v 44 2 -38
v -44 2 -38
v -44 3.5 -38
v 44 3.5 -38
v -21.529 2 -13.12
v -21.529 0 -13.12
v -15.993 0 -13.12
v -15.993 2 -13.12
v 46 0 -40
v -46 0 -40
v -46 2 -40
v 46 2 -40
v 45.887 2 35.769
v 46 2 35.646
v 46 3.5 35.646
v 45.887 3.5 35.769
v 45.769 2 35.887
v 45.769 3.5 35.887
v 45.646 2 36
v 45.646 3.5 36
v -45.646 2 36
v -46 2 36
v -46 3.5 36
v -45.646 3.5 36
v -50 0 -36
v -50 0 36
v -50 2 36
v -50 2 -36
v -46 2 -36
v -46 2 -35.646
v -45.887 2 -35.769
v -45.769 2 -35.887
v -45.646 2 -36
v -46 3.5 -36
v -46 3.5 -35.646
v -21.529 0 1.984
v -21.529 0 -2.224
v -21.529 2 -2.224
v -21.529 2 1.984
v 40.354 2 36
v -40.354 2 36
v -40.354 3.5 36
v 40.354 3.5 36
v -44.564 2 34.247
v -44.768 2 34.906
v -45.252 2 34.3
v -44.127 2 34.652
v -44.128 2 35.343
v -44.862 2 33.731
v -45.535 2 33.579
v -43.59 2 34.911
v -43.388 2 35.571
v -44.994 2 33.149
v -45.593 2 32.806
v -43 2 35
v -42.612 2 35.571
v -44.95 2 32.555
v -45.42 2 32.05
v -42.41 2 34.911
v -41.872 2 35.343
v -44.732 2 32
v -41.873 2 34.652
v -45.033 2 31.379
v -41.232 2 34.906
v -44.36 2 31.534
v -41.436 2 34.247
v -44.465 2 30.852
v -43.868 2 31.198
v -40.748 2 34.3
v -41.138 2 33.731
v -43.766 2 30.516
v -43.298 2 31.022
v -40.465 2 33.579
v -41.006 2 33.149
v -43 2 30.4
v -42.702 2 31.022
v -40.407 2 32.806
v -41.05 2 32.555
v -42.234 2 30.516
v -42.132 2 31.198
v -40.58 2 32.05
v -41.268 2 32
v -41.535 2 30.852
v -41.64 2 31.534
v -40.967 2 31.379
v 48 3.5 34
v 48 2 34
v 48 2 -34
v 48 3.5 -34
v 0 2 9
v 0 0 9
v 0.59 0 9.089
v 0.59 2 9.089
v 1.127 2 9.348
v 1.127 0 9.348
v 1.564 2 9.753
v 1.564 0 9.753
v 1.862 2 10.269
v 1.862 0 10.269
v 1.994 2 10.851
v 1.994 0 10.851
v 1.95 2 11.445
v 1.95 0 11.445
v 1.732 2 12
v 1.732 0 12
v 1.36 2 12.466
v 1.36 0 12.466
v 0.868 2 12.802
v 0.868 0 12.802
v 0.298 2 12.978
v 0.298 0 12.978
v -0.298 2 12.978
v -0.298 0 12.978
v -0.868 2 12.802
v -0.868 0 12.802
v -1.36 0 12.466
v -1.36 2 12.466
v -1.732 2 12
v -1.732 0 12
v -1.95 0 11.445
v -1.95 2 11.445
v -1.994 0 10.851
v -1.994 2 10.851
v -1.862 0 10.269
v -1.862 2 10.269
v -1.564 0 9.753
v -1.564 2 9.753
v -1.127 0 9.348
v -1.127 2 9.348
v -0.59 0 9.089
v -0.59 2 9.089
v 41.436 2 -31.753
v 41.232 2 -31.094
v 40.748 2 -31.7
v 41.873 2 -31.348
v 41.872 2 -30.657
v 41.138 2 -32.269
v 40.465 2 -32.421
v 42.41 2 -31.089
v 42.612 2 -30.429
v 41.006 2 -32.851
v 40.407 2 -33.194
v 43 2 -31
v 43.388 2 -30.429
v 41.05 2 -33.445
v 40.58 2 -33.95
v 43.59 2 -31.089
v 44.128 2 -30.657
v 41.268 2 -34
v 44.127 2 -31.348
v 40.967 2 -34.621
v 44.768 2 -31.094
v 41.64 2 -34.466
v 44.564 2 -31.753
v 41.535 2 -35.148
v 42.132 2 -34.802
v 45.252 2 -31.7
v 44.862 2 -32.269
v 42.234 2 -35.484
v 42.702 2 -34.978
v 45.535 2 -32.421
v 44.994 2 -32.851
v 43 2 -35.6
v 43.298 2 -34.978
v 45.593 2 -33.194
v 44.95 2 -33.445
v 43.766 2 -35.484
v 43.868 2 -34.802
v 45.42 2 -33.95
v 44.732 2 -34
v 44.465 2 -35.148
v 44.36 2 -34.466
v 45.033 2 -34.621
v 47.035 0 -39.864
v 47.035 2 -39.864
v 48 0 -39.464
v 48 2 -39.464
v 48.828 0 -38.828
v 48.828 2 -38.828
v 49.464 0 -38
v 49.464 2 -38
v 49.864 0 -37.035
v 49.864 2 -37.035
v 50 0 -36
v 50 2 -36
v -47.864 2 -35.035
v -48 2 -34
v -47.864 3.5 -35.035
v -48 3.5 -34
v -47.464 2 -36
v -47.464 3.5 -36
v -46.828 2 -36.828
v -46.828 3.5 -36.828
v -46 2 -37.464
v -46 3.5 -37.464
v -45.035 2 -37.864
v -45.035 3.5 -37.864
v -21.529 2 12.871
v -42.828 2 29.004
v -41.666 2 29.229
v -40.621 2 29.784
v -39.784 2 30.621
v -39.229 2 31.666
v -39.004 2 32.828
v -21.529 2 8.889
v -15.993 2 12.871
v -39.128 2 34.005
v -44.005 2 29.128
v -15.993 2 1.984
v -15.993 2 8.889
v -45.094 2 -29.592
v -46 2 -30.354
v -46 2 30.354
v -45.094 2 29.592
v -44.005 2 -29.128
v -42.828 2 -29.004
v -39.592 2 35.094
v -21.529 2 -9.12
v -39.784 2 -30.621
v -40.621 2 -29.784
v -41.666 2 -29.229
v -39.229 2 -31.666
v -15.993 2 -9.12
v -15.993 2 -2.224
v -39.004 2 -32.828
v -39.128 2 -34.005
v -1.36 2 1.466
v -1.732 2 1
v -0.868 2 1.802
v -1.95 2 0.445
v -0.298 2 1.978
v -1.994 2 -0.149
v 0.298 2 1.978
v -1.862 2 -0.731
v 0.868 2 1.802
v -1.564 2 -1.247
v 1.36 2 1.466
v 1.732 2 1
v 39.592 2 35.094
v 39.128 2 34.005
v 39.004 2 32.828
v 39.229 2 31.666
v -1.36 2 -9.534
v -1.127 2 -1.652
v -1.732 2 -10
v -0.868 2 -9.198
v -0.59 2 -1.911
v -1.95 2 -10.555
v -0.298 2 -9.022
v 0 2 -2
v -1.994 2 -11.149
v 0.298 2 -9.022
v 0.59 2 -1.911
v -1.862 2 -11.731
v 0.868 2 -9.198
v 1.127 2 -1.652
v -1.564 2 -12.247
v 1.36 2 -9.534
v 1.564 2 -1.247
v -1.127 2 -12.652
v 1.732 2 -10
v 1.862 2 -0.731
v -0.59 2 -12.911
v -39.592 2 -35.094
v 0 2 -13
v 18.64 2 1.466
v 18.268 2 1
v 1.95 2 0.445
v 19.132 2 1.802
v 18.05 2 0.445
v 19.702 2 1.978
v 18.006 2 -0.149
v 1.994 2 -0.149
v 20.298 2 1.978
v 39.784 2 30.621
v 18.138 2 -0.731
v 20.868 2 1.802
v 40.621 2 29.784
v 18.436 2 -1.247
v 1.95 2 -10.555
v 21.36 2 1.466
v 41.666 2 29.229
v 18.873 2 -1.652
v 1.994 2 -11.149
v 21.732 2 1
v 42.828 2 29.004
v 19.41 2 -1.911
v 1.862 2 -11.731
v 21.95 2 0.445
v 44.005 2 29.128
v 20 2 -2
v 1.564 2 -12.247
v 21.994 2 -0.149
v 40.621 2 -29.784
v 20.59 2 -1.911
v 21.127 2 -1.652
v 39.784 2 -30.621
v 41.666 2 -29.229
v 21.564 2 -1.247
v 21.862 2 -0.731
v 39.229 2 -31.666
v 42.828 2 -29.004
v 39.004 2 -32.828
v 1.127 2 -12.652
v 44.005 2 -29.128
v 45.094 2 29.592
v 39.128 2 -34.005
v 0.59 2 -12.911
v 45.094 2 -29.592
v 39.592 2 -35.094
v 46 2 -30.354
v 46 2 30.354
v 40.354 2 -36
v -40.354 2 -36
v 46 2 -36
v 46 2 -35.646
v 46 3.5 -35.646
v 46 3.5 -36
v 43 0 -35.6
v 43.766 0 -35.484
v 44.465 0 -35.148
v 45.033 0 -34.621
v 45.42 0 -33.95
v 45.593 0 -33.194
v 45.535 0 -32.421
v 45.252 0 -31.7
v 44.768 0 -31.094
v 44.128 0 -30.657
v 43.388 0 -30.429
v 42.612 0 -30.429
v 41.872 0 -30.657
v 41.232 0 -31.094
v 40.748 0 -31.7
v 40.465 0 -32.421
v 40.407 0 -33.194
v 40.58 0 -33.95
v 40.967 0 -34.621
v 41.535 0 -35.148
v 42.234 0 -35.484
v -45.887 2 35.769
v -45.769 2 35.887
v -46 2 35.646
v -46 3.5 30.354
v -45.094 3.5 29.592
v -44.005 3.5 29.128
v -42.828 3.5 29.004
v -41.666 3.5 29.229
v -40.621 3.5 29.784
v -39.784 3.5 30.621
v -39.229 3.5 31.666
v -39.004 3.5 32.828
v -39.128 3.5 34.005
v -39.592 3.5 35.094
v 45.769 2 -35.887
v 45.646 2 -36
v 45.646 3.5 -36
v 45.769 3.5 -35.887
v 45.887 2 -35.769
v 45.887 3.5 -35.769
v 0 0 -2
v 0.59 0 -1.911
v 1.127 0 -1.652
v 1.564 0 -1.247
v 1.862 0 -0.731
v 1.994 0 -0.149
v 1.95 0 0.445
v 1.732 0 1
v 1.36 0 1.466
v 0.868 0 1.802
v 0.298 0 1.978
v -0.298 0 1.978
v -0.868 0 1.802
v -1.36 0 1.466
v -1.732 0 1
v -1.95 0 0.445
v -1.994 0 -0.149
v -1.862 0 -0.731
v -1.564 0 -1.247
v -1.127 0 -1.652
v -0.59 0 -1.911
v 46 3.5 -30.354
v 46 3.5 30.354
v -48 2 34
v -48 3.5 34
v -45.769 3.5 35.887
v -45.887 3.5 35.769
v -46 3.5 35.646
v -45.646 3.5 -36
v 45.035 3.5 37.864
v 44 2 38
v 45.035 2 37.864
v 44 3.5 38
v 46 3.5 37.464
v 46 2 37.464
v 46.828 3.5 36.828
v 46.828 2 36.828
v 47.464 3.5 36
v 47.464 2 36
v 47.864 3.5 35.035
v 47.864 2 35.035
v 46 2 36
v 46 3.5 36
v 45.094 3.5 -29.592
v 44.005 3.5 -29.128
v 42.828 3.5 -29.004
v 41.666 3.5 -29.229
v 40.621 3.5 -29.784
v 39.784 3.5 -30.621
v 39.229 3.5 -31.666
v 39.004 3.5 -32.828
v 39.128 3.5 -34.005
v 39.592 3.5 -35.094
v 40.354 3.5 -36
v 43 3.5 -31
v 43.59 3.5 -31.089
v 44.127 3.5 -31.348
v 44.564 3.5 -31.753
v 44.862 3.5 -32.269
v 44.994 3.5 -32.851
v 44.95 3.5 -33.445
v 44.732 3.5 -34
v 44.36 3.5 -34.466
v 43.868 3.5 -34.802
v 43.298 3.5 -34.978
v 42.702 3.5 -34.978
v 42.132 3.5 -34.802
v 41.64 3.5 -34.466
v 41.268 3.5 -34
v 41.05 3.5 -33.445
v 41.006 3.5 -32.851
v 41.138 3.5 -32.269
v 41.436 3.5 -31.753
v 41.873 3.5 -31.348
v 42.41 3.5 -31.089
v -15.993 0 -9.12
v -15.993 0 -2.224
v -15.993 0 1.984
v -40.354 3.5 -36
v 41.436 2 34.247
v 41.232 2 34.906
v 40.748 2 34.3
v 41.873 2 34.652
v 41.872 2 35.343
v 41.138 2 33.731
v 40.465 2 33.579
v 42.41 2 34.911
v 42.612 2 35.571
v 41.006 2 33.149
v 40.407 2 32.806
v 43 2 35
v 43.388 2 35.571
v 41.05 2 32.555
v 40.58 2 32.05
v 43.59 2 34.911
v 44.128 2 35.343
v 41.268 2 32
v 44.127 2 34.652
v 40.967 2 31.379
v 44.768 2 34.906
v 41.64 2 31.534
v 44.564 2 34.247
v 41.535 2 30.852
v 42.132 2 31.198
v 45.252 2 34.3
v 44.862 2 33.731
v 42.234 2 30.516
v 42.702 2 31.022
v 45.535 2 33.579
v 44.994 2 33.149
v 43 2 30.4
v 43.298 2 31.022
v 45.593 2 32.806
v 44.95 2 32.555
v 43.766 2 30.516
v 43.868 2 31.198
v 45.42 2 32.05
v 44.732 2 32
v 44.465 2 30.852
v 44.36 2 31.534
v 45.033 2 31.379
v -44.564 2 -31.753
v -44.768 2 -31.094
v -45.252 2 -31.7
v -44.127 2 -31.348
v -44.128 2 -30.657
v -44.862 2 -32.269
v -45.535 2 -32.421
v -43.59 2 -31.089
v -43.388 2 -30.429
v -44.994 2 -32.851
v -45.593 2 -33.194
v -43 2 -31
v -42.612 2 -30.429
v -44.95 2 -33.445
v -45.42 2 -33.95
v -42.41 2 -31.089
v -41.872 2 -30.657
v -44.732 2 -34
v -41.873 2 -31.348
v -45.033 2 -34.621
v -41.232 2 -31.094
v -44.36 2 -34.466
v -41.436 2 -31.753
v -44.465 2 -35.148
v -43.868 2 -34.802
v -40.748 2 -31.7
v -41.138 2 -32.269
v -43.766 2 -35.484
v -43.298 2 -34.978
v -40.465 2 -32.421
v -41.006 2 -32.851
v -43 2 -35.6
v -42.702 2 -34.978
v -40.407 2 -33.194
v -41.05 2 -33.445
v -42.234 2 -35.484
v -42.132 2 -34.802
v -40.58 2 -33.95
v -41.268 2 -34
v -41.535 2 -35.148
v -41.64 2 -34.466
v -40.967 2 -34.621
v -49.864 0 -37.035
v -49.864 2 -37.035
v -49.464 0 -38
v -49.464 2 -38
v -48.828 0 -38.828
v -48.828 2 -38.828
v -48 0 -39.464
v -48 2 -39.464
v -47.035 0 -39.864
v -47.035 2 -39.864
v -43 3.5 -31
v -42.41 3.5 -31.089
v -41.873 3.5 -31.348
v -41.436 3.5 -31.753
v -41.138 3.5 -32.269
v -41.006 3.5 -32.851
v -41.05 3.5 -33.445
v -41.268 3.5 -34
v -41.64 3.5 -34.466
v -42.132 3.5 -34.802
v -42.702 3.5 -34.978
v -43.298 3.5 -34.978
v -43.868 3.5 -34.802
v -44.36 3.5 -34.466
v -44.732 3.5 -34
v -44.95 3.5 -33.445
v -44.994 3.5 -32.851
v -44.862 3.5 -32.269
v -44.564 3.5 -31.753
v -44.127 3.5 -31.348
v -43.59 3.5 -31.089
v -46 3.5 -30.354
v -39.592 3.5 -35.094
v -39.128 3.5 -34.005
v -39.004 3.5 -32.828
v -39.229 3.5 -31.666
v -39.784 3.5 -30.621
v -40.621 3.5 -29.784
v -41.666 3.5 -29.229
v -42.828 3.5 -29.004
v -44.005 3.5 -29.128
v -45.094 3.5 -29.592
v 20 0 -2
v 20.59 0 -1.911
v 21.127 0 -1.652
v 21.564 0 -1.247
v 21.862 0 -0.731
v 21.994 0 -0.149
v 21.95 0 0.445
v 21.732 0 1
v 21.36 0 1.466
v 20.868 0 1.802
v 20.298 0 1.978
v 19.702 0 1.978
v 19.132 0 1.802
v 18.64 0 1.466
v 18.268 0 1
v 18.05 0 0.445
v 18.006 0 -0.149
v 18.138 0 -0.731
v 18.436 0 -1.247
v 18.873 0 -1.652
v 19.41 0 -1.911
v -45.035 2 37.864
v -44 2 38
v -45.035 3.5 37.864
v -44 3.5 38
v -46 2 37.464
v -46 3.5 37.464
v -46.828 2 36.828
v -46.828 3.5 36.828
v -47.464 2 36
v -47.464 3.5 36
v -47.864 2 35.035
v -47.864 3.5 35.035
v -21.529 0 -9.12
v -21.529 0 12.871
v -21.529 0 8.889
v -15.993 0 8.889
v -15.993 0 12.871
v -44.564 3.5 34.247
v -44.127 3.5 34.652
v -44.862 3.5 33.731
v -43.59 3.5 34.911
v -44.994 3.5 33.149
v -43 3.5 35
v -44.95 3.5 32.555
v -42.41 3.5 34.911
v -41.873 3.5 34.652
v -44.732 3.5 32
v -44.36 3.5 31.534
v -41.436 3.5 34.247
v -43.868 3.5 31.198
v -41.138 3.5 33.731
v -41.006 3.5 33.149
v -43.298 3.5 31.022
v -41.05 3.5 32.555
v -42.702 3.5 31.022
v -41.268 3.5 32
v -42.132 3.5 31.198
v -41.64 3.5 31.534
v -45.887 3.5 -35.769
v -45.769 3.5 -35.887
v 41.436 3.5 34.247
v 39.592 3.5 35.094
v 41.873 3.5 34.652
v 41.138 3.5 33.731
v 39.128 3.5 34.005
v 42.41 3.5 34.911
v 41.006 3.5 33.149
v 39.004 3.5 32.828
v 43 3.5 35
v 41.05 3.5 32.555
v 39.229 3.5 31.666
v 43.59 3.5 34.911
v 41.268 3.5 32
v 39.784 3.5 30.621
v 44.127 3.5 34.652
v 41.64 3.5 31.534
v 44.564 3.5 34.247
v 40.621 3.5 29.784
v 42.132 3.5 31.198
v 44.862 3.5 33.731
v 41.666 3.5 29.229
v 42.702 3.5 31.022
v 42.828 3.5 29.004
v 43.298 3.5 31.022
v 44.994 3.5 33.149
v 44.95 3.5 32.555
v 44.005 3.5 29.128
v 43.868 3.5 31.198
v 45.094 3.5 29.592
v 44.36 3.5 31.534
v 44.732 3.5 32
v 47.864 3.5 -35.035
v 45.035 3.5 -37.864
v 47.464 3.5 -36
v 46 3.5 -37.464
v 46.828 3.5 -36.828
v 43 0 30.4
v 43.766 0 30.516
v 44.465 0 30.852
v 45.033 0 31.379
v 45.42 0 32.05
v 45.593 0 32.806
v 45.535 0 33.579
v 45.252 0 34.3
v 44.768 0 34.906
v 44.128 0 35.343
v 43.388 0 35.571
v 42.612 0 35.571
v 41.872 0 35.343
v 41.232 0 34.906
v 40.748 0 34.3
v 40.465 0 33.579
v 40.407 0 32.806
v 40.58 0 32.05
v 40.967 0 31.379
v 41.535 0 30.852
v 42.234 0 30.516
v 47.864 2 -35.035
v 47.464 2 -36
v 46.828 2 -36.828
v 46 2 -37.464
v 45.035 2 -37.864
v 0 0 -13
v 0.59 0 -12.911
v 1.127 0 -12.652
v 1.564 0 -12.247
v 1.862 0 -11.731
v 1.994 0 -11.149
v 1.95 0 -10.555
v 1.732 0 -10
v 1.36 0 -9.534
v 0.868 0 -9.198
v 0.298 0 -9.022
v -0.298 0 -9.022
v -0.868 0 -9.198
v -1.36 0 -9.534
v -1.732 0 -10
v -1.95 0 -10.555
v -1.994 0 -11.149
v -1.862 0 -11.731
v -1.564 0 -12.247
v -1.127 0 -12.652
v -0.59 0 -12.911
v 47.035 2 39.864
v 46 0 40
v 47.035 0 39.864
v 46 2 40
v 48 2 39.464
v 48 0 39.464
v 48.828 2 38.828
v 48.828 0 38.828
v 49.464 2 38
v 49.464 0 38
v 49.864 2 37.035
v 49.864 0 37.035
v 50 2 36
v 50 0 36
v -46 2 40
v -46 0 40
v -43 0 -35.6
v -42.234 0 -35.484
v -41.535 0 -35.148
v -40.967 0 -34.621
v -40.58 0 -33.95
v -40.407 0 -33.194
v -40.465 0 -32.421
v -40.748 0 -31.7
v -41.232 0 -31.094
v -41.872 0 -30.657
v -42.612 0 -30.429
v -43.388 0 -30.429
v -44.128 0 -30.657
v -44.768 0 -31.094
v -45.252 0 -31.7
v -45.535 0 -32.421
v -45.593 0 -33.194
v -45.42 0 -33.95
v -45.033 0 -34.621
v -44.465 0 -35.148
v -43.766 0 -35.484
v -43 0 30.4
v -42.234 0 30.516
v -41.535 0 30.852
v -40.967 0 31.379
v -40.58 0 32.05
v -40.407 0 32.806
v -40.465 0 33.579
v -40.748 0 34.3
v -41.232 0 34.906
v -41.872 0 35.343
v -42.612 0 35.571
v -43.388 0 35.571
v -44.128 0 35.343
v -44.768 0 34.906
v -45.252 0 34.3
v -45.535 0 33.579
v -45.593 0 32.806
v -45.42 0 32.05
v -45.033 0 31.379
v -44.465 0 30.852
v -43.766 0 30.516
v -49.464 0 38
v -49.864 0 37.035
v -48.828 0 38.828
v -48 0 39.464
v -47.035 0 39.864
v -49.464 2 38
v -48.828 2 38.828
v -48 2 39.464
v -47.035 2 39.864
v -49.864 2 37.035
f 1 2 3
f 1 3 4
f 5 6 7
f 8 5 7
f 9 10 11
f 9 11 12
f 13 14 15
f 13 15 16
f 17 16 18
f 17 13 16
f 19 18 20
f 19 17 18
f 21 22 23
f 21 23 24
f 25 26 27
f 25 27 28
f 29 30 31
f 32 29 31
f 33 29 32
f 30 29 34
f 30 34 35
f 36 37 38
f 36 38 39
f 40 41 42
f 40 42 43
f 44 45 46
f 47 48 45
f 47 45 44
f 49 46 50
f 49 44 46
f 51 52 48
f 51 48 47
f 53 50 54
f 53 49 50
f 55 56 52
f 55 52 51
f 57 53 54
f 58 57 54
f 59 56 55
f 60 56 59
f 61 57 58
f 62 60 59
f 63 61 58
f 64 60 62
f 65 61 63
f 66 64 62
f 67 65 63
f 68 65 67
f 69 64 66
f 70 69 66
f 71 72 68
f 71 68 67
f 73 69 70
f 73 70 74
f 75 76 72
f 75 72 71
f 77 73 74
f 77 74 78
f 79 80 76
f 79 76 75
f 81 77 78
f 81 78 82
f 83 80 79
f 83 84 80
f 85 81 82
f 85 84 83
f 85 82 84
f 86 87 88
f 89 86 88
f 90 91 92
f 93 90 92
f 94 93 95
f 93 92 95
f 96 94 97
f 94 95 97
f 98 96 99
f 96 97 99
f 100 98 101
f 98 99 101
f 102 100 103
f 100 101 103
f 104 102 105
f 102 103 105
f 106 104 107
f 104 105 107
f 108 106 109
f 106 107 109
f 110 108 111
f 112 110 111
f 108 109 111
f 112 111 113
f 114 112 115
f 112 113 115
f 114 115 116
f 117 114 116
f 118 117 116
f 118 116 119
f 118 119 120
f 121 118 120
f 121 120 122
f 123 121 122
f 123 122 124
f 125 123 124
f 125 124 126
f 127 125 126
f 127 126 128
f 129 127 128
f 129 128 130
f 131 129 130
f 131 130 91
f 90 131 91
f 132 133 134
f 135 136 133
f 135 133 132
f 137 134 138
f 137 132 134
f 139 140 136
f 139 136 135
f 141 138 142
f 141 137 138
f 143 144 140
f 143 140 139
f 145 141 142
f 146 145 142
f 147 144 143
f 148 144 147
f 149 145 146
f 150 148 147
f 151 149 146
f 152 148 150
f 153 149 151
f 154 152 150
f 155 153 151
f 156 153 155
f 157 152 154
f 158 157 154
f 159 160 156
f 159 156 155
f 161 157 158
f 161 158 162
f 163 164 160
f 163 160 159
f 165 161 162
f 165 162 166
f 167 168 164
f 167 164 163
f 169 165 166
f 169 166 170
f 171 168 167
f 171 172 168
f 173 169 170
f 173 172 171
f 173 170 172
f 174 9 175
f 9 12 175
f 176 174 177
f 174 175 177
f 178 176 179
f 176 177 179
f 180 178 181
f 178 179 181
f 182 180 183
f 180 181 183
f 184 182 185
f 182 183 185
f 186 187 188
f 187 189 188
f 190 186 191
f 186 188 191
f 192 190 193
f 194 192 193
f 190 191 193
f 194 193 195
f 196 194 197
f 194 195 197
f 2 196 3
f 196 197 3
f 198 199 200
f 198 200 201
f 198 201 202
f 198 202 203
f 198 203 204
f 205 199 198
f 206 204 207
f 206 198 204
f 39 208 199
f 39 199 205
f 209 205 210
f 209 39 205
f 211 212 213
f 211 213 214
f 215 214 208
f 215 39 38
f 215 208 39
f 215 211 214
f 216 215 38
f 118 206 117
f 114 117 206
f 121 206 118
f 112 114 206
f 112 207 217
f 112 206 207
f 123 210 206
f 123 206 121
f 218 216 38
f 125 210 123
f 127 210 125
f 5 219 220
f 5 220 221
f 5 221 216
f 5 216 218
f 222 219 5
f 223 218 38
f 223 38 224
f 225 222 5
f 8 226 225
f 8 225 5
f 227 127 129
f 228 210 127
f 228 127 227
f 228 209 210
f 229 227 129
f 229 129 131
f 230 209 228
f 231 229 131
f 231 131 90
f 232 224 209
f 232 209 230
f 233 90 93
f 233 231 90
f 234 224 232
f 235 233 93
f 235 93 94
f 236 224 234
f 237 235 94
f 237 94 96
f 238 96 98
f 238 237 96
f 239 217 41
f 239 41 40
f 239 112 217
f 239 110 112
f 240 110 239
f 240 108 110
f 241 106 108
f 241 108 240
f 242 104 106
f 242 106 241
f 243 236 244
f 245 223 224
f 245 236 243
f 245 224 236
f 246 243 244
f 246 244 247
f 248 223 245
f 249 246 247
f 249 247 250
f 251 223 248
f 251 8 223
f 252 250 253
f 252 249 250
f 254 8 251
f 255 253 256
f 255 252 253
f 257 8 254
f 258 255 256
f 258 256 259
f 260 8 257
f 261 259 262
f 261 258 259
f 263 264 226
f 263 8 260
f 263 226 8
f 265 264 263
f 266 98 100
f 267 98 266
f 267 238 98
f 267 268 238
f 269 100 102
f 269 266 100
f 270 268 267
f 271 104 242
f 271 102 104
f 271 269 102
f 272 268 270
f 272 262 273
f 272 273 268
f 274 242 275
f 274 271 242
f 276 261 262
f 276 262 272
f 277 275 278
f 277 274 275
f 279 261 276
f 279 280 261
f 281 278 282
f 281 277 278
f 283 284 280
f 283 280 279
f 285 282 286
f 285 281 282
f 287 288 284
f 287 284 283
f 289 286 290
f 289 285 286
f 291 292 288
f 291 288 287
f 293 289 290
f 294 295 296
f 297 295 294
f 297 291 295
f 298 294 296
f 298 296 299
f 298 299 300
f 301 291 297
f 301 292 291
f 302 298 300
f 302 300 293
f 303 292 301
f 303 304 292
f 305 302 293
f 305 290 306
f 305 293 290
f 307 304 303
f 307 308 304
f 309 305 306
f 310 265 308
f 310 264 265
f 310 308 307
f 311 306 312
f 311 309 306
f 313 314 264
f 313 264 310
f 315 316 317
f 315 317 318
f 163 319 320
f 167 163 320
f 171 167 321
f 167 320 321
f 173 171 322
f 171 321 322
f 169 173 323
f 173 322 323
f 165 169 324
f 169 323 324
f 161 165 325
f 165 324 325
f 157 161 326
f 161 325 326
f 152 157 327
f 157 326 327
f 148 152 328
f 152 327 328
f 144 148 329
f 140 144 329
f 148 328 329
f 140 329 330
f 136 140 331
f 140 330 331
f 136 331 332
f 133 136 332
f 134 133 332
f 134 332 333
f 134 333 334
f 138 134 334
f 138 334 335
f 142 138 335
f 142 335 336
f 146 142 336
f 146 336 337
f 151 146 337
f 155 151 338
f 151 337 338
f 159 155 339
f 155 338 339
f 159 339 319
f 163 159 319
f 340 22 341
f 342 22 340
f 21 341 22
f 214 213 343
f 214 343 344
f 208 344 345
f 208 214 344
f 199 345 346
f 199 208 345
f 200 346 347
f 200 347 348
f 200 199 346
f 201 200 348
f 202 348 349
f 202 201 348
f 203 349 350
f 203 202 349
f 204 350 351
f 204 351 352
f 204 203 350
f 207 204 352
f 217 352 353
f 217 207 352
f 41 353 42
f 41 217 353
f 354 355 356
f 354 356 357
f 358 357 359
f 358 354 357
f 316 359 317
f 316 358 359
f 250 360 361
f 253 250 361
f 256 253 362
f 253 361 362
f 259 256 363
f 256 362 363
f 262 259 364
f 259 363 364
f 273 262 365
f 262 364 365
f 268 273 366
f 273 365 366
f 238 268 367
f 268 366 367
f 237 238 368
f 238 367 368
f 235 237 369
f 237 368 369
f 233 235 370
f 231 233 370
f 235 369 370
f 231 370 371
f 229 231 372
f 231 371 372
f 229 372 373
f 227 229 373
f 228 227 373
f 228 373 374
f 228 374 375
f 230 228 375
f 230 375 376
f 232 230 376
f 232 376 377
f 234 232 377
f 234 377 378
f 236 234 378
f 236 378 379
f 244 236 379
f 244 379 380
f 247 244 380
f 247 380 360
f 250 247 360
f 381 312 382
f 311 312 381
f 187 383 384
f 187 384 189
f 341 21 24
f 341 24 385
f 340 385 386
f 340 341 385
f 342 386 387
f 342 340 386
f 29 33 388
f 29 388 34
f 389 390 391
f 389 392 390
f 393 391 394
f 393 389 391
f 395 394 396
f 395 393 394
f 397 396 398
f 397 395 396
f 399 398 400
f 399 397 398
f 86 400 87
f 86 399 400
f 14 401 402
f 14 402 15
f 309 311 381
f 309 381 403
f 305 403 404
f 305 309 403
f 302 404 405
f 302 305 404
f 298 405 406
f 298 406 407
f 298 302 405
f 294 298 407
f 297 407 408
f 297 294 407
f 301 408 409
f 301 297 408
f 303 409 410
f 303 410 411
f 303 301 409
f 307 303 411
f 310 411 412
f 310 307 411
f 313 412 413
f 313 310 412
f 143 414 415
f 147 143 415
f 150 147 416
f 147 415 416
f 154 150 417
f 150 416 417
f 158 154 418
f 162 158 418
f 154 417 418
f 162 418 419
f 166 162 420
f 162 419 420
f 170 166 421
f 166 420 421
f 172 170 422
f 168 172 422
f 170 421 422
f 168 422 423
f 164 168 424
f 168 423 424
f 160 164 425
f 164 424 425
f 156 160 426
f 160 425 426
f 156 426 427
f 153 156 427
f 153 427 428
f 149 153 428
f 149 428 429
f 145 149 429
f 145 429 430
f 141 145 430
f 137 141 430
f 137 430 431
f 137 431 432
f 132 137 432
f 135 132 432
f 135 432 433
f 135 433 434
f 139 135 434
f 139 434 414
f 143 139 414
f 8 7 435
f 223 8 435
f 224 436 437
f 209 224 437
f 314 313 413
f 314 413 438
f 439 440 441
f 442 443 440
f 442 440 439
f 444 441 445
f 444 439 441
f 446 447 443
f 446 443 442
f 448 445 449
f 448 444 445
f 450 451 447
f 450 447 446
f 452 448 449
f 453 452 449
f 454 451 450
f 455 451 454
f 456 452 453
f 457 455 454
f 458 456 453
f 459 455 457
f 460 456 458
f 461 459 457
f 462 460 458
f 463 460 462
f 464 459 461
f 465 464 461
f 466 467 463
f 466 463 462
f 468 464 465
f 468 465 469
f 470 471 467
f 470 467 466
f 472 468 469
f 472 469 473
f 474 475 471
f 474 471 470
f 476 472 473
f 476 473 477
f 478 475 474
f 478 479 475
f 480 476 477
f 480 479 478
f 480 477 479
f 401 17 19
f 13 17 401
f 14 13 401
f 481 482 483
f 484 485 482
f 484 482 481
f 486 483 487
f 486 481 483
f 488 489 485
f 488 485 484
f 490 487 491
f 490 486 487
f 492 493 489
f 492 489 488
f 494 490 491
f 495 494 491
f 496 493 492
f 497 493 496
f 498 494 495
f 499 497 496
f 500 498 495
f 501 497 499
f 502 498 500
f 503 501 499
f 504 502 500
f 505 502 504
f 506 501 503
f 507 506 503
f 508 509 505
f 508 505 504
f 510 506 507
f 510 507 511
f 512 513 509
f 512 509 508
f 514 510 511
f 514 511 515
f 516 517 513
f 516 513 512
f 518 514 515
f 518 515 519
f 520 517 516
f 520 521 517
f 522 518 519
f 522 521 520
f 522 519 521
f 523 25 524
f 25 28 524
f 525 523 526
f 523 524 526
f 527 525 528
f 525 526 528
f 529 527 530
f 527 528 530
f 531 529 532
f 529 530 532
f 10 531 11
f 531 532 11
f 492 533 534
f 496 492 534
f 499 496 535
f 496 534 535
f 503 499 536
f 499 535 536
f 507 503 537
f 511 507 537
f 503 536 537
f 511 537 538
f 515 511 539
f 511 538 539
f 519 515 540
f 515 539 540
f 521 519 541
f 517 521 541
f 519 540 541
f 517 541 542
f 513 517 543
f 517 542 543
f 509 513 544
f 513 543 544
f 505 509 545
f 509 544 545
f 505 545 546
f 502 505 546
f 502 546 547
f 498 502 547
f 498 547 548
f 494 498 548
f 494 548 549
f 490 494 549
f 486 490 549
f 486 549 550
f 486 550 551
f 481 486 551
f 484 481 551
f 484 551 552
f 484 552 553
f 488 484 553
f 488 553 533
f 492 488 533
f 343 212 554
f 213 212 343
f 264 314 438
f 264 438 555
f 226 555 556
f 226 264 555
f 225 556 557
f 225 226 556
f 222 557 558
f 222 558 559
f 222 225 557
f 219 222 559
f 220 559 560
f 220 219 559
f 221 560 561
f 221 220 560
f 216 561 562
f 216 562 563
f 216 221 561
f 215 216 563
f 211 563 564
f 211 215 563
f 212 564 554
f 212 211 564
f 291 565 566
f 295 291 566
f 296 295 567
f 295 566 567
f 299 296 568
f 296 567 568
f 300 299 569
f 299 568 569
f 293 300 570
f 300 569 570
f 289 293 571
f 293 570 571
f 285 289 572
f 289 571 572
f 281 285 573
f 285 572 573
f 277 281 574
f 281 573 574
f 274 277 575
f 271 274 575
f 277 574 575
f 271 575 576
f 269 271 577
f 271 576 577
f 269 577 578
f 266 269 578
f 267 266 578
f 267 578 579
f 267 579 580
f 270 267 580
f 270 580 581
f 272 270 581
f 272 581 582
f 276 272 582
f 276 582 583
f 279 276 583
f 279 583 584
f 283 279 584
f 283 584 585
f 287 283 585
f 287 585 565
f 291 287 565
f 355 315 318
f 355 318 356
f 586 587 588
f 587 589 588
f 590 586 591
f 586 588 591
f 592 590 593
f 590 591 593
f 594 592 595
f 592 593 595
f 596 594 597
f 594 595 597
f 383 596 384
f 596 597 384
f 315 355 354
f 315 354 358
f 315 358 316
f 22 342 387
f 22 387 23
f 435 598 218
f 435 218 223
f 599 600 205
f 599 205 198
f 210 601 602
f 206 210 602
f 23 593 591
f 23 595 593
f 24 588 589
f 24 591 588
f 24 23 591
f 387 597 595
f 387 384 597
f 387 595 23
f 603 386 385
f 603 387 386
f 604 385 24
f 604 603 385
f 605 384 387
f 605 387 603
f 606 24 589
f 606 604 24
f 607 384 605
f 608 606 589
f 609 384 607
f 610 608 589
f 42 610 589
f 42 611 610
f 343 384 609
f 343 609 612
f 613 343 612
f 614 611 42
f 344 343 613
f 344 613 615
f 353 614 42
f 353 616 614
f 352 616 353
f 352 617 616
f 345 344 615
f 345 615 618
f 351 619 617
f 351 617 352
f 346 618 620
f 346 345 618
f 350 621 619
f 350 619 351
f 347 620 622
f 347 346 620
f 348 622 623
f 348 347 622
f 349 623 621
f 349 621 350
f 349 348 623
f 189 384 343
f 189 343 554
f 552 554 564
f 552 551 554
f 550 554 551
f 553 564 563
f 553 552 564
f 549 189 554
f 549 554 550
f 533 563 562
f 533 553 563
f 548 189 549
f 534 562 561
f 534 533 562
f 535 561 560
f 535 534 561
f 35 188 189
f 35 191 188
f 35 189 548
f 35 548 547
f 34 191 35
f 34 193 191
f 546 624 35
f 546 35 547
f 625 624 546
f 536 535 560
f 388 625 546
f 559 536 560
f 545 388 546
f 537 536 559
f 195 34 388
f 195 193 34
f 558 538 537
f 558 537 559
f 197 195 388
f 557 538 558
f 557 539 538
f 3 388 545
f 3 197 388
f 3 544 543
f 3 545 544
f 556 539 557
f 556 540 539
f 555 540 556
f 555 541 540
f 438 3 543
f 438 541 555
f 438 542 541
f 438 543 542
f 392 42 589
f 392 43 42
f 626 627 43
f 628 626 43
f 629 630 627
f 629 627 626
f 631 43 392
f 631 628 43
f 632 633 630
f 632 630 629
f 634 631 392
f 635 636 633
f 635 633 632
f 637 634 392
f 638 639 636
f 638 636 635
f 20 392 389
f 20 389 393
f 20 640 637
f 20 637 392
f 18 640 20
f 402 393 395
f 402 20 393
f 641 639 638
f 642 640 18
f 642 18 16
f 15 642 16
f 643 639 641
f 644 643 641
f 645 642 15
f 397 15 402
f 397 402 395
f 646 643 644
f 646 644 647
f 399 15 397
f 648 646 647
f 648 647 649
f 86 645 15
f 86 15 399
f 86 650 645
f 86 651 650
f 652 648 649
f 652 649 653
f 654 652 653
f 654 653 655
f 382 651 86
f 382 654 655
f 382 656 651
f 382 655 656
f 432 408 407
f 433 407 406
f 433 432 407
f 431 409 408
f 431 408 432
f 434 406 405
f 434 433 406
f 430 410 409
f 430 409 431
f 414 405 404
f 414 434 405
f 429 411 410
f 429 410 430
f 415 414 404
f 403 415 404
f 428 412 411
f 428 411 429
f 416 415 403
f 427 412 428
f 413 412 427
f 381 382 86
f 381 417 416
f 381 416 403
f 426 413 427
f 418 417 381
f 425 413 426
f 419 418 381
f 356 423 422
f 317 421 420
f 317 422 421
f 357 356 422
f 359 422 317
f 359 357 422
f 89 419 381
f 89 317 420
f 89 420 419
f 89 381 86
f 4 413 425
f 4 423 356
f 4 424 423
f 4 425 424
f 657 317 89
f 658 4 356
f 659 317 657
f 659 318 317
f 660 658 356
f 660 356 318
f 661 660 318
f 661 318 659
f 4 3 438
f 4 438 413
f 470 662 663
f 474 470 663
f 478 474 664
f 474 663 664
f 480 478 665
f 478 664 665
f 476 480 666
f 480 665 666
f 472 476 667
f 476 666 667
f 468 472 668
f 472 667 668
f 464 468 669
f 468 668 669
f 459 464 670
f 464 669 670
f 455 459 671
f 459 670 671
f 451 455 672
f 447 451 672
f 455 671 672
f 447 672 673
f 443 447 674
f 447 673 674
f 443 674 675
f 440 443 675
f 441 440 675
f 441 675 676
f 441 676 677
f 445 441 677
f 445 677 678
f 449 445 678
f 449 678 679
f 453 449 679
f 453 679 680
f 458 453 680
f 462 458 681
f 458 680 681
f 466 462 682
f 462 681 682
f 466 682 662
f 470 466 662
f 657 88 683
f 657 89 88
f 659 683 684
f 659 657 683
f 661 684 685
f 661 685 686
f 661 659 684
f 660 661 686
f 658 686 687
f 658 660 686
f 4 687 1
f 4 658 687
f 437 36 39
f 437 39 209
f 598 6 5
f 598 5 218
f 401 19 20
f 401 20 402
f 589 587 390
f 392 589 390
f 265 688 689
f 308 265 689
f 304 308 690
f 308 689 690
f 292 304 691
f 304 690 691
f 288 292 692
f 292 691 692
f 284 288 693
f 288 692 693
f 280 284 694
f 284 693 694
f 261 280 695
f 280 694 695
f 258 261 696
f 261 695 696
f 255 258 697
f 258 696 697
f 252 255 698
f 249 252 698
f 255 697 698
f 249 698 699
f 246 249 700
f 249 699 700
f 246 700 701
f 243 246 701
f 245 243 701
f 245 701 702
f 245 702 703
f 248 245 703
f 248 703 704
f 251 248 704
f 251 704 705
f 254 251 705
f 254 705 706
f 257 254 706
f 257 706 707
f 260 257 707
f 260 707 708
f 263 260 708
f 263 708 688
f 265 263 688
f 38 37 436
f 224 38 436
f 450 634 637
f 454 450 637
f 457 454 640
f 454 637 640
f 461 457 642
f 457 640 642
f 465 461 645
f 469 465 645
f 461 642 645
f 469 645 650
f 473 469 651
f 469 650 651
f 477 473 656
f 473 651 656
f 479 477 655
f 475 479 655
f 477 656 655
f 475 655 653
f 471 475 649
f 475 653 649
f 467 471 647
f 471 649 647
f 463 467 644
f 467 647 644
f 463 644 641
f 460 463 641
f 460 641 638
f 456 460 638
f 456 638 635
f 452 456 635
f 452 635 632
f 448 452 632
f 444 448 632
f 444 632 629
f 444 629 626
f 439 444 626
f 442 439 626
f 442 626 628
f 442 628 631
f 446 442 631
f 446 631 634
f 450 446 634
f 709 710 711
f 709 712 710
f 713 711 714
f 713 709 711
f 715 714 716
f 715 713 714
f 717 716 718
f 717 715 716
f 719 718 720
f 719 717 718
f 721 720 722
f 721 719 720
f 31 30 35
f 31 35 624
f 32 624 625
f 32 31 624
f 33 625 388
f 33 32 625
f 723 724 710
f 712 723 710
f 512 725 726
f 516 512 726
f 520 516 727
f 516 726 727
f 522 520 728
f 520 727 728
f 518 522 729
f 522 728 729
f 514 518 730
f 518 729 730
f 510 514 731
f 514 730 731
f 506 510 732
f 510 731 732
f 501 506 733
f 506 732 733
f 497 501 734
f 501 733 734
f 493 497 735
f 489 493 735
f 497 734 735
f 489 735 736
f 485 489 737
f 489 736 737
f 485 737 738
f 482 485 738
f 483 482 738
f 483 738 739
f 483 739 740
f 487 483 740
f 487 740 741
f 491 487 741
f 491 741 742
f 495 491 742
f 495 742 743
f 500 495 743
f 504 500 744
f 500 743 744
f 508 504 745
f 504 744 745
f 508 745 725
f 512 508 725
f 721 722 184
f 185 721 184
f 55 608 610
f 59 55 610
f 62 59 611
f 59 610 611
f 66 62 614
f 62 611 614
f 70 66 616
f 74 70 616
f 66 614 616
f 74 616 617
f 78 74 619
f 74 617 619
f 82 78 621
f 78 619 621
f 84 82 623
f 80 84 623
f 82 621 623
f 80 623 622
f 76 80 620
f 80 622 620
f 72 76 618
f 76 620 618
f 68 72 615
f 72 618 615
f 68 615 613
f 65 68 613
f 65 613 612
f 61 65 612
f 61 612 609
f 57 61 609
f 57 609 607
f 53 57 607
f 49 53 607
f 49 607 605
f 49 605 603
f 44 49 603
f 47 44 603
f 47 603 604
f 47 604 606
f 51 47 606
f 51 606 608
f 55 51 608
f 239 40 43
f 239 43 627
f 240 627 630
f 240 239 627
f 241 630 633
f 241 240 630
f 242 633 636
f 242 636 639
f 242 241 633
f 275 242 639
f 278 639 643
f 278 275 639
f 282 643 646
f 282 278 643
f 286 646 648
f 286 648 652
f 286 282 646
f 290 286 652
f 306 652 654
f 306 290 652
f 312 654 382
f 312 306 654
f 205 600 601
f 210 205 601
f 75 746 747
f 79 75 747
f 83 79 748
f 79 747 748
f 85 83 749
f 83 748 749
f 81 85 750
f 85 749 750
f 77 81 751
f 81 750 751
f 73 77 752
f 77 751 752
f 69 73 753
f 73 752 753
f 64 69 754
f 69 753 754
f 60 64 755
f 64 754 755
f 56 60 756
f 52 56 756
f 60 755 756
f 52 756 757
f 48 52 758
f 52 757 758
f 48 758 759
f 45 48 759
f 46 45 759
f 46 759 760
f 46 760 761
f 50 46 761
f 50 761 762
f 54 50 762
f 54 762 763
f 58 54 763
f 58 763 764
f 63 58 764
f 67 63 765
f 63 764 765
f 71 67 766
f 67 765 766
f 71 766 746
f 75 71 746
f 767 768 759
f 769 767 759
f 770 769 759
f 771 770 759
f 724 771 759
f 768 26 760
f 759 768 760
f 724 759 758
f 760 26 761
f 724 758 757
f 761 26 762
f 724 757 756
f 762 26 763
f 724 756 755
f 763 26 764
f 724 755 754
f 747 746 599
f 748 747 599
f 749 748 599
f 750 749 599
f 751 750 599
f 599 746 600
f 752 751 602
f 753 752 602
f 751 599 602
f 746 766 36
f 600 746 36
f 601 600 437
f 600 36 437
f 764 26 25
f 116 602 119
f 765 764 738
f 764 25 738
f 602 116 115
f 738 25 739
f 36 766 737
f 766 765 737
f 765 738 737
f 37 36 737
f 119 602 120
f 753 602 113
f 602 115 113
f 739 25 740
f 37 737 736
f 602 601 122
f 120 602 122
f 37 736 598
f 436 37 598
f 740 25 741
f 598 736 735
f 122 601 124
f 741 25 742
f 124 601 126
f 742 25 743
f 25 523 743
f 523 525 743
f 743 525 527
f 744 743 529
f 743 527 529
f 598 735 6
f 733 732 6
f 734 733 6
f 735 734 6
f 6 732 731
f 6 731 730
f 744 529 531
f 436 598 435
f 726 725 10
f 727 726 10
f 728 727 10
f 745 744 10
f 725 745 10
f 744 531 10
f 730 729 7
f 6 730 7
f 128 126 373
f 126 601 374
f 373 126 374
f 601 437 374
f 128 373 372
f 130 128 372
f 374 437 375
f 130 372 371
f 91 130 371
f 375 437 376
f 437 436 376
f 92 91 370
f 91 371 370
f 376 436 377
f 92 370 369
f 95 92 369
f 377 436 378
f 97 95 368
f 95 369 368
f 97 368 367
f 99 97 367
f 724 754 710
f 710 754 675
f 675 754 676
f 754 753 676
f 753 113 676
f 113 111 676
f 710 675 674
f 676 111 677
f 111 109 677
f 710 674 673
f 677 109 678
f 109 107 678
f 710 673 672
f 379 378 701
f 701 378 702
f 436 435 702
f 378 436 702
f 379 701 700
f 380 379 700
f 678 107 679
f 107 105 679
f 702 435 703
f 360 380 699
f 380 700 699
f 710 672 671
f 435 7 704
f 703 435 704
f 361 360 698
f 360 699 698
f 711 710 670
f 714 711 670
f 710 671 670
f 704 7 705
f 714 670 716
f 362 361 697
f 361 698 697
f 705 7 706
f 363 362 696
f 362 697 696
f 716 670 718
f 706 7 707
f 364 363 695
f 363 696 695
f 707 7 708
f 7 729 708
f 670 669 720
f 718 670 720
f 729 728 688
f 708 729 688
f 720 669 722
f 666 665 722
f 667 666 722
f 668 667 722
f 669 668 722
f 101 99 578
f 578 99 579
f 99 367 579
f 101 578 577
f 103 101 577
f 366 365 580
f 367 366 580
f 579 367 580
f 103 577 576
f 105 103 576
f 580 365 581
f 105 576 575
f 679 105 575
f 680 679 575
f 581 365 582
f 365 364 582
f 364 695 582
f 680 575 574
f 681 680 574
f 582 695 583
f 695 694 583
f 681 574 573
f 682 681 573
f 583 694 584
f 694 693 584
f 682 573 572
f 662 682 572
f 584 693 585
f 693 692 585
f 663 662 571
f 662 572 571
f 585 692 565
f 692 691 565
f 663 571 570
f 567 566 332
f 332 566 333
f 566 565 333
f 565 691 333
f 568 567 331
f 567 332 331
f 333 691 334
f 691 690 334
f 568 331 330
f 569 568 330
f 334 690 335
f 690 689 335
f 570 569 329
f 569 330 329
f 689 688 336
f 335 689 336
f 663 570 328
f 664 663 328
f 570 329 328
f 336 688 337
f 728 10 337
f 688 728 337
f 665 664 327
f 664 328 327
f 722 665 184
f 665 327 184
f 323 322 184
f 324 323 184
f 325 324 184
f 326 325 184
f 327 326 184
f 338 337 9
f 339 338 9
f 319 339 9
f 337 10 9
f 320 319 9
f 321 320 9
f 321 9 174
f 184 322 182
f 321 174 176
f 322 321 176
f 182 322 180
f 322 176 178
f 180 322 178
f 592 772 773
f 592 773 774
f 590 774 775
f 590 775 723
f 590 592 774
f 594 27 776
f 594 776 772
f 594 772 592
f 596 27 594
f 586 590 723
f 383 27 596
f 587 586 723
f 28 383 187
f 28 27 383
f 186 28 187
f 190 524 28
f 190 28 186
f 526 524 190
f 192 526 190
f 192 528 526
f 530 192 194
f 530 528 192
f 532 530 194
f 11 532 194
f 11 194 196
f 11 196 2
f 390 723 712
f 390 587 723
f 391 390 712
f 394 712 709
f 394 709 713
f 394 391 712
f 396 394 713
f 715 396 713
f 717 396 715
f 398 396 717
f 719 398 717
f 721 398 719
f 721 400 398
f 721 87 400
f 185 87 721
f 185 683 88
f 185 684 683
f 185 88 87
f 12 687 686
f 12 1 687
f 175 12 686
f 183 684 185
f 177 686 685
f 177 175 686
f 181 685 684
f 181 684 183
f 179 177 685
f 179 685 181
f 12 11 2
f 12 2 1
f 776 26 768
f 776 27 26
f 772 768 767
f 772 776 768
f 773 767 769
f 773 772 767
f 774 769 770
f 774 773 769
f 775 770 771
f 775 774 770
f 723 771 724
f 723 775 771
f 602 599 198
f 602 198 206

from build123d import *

# Parameters (mm, degrees)
SKETCH1_W           = 100
SKETCH1_H           = 80
BOSS_EXTRUDE2_DEPTH = 2
SKETCH3_W           = 96
SKETCH3_H           = 76
BOSS_EXTRUDE3_DEPTH = 1.5
SKETCH5_R           = 2
CUT_EXTRUDE1_DEPTH  = 35
SHELL1_START        = 2
SHELL1_DEPTH        = 1.5
FILLET1_R           = 4
FILLET2_R           = 4
FILLET3_R           = 4
SKETCH10_R          = 2
SKETCH10_W          = 5.536600299
SKETCH10_H          = 4
SKETCH10_H_2        = 4.208329991
SKETCH10_H_3        = 3.982444476
CUT_EXTRUDE2_DEPTH  = 5
SKETCH11_R          = 2.6
CUT_EXTRUDE3_DEPTH  = 2


# Read off the part's stored shape, not the designer's step: Shell1
with BuildPart() as part:
    # Sketch1 → Boss-Extrude2 (new body)
    with BuildSketch(Plane(origin=(0, 0, 0), x_dir=(1, 0, 0), z_dir=(0, 1, 0))):
        Rectangle(SKETCH1_W, SKETCH1_H)
    extrude(amount=BOSS_EXTRUDE2_DEPTH)

    # Sketch3 → Boss-Extrude3 (add)
    with BuildSketch(Plane(origin=(0, 2, 0), x_dir=(1, 0, 0), z_dir=(0, 1, 0))):
        Rectangle(SKETCH3_W, SKETCH3_H)
    extrude(amount=BOSS_EXTRUDE3_DEPTH)

    # Sketch5 → Cut-Extrude1 (cut)
    with BuildSketch(Plane(origin=(0, 3.5, 0), x_dir=(1, 0, 0), z_dir=(0, 1, 0))):
        with Locations(Location((-43, -33, 0), (0, 0, 270))):
            Circle(SKETCH5_R)
        with Locations(Location((-43, 33, 0), (0, 0, 270))):
            Circle(SKETCH5_R)
        with Locations(Location((43, -33, 0), (0, 0, 270))):
            Circle(SKETCH5_R)
        with Locations(Location((43, 33, 0), (0, 0, 270))):
            Circle(SKETCH5_R)
    extrude(amount=-CUT_EXTRUDE1_DEPTH, mode=Mode.SUBTRACT)

    # Shell1 outline → Shell1 (cut)
    with BuildSketch(Plane(origin=(0, 0, 0), x_dir=(1, 0, 0), z_dir=(0, 1, 0)).offset(SHELL1_START)):
        with BuildLine():
            ThreePointArc((-46, 35.645751311), (-45.828427125, 35.828427125), (-45.645751311, 36))
            Line((-45.645751311, 36), (-46, 36))
            Line((-46, 36), (-46, 35.645751311))
        make_face()
        with BuildLine():
            ThreePointArc((-40.354248689, 36), (-40.171572875, 30.171572875), (-46, 30.354248689))
            Line((-46, 30.354248689), (-46, -30.354248689))
            ThreePointArc((-46, -30.354248689), (-40.171572875, -30.171572875), (-40.354248689, -36))
            Line((-40.354248689, -36), (40.354248689, -36))
            ThreePointArc((40.354248689, -36), (40.171572875, -30.171572875), (46, -30.354248689))
            Line((46, -30.354248689), (46, 30.354248689))
            ThreePointArc((46, 30.354248689), (40.171572875, 30.171572875), (40.354248689, 36))
            Line((40.354248689, 36), (-40.354248689, 36))
        make_face()
        with BuildLine():
            Line((46, 36), (45.645751311, 36))
            ThreePointArc((45.645751311, 36), (45.828427125, 35.828427125), (46, 35.645751311))
            Line((46, 35.645751311), (46, 36))
        make_face()
        with BuildLine():
            Line((-46, -35.645751311), (-46, -36))
            Line((-46, -36), (-45.645751311, -36))
            ThreePointArc((-45.645751311, -36), (-45.828427125, -35.828427125), (-46, -35.645751311))
        make_face()
        with BuildLine():
            ThreePointArc((46, -35.645751311), (45.828427125, -35.828427125), (45.645751311, -36))
            Line((45.645751311, -36), (46, -36))
            Line((46, -36), (46, -35.645751311))
        make_face()
    extrude(amount=SHELL1_DEPTH, mode=Mode.SUBTRACT)

    # Fillet1
    fillet1_edges = [part.edges().sort_by_distance(p)[0] for p in [
        (-48, 2.75, 38),
    ]]
    fillet(fillet1_edges, radius=FILLET1_R)

    # Fillet2
    fillet2_edges = [part.edges().sort_by_distance(p)[0] for p in [
        (48, 2.75, 38),
        (48, 2.75, -38),
        (-48, 2.75, -38),
    ]]
    fillet(fillet2_edges, radius=FILLET2_R)

    # Fillet3
    fillet3_edges = [part.edges().sort_by_distance(p)[0] for p in [
        (-50, 1, -40),
        (50, 1, -40),
        (50, 1, 40),
        (-50, 1, 40),
    ]]
    fillet(fillet3_edges, radius=FILLET3_R)

    # Sketch10 → Cut-Extrude2 (cut)
    with BuildSketch(Plane.XZ):
        with Locations(Location((0, -11, 0), (0, 0, 270))):
            Circle(SKETCH10_R)
        with Locations(Location((0, 0, 0), (0, 0, 270))):
            Circle(SKETCH10_R)
        with Locations(Location((0, 11, 0), (0, 0, 270))):
            Circle(SKETCH10_R)
        with Locations(Location((20, 0, 0), (0, 0, 270))):
            Circle(SKETCH10_R)
        with Locations((-18.761111615, -11.119893759)):
            Rectangle(SKETCH10_W, SKETCH10_H)
        with Locations((-18.761111615, -0.119893758)):
            Rectangle(SKETCH10_W, SKETCH10_H_2)
        with Locations((-18.761111615, 10.880106241)):
            Rectangle(SKETCH10_W, SKETCH10_H_3)
    extrude(amount=-CUT_EXTRUDE2_DEPTH, mode=Mode.SUBTRACT)

    # Sketch11 → Cut-Extrude3 (cut)
    with BuildSketch(Plane.XZ):
        with Locations(Location((43, 33, 0), (0, 0, 270))):
            Circle(SKETCH11_R)
        with Locations(Location((43, -33, 0), (0, 0, 270))):
            Circle(SKETCH11_R)
        with Locations(Location((-43, -33, 0), (0, 0, 270))):
            Circle(SKETCH11_R)
        with Locations(Location((-43, 33, 0), (0, 0, 270))):
            Circle(SKETCH11_R)
    extrude(amount=-CUT_EXTRUDE3_DEPTH, mode=Mode.SUBTRACT)


solid = part.part
